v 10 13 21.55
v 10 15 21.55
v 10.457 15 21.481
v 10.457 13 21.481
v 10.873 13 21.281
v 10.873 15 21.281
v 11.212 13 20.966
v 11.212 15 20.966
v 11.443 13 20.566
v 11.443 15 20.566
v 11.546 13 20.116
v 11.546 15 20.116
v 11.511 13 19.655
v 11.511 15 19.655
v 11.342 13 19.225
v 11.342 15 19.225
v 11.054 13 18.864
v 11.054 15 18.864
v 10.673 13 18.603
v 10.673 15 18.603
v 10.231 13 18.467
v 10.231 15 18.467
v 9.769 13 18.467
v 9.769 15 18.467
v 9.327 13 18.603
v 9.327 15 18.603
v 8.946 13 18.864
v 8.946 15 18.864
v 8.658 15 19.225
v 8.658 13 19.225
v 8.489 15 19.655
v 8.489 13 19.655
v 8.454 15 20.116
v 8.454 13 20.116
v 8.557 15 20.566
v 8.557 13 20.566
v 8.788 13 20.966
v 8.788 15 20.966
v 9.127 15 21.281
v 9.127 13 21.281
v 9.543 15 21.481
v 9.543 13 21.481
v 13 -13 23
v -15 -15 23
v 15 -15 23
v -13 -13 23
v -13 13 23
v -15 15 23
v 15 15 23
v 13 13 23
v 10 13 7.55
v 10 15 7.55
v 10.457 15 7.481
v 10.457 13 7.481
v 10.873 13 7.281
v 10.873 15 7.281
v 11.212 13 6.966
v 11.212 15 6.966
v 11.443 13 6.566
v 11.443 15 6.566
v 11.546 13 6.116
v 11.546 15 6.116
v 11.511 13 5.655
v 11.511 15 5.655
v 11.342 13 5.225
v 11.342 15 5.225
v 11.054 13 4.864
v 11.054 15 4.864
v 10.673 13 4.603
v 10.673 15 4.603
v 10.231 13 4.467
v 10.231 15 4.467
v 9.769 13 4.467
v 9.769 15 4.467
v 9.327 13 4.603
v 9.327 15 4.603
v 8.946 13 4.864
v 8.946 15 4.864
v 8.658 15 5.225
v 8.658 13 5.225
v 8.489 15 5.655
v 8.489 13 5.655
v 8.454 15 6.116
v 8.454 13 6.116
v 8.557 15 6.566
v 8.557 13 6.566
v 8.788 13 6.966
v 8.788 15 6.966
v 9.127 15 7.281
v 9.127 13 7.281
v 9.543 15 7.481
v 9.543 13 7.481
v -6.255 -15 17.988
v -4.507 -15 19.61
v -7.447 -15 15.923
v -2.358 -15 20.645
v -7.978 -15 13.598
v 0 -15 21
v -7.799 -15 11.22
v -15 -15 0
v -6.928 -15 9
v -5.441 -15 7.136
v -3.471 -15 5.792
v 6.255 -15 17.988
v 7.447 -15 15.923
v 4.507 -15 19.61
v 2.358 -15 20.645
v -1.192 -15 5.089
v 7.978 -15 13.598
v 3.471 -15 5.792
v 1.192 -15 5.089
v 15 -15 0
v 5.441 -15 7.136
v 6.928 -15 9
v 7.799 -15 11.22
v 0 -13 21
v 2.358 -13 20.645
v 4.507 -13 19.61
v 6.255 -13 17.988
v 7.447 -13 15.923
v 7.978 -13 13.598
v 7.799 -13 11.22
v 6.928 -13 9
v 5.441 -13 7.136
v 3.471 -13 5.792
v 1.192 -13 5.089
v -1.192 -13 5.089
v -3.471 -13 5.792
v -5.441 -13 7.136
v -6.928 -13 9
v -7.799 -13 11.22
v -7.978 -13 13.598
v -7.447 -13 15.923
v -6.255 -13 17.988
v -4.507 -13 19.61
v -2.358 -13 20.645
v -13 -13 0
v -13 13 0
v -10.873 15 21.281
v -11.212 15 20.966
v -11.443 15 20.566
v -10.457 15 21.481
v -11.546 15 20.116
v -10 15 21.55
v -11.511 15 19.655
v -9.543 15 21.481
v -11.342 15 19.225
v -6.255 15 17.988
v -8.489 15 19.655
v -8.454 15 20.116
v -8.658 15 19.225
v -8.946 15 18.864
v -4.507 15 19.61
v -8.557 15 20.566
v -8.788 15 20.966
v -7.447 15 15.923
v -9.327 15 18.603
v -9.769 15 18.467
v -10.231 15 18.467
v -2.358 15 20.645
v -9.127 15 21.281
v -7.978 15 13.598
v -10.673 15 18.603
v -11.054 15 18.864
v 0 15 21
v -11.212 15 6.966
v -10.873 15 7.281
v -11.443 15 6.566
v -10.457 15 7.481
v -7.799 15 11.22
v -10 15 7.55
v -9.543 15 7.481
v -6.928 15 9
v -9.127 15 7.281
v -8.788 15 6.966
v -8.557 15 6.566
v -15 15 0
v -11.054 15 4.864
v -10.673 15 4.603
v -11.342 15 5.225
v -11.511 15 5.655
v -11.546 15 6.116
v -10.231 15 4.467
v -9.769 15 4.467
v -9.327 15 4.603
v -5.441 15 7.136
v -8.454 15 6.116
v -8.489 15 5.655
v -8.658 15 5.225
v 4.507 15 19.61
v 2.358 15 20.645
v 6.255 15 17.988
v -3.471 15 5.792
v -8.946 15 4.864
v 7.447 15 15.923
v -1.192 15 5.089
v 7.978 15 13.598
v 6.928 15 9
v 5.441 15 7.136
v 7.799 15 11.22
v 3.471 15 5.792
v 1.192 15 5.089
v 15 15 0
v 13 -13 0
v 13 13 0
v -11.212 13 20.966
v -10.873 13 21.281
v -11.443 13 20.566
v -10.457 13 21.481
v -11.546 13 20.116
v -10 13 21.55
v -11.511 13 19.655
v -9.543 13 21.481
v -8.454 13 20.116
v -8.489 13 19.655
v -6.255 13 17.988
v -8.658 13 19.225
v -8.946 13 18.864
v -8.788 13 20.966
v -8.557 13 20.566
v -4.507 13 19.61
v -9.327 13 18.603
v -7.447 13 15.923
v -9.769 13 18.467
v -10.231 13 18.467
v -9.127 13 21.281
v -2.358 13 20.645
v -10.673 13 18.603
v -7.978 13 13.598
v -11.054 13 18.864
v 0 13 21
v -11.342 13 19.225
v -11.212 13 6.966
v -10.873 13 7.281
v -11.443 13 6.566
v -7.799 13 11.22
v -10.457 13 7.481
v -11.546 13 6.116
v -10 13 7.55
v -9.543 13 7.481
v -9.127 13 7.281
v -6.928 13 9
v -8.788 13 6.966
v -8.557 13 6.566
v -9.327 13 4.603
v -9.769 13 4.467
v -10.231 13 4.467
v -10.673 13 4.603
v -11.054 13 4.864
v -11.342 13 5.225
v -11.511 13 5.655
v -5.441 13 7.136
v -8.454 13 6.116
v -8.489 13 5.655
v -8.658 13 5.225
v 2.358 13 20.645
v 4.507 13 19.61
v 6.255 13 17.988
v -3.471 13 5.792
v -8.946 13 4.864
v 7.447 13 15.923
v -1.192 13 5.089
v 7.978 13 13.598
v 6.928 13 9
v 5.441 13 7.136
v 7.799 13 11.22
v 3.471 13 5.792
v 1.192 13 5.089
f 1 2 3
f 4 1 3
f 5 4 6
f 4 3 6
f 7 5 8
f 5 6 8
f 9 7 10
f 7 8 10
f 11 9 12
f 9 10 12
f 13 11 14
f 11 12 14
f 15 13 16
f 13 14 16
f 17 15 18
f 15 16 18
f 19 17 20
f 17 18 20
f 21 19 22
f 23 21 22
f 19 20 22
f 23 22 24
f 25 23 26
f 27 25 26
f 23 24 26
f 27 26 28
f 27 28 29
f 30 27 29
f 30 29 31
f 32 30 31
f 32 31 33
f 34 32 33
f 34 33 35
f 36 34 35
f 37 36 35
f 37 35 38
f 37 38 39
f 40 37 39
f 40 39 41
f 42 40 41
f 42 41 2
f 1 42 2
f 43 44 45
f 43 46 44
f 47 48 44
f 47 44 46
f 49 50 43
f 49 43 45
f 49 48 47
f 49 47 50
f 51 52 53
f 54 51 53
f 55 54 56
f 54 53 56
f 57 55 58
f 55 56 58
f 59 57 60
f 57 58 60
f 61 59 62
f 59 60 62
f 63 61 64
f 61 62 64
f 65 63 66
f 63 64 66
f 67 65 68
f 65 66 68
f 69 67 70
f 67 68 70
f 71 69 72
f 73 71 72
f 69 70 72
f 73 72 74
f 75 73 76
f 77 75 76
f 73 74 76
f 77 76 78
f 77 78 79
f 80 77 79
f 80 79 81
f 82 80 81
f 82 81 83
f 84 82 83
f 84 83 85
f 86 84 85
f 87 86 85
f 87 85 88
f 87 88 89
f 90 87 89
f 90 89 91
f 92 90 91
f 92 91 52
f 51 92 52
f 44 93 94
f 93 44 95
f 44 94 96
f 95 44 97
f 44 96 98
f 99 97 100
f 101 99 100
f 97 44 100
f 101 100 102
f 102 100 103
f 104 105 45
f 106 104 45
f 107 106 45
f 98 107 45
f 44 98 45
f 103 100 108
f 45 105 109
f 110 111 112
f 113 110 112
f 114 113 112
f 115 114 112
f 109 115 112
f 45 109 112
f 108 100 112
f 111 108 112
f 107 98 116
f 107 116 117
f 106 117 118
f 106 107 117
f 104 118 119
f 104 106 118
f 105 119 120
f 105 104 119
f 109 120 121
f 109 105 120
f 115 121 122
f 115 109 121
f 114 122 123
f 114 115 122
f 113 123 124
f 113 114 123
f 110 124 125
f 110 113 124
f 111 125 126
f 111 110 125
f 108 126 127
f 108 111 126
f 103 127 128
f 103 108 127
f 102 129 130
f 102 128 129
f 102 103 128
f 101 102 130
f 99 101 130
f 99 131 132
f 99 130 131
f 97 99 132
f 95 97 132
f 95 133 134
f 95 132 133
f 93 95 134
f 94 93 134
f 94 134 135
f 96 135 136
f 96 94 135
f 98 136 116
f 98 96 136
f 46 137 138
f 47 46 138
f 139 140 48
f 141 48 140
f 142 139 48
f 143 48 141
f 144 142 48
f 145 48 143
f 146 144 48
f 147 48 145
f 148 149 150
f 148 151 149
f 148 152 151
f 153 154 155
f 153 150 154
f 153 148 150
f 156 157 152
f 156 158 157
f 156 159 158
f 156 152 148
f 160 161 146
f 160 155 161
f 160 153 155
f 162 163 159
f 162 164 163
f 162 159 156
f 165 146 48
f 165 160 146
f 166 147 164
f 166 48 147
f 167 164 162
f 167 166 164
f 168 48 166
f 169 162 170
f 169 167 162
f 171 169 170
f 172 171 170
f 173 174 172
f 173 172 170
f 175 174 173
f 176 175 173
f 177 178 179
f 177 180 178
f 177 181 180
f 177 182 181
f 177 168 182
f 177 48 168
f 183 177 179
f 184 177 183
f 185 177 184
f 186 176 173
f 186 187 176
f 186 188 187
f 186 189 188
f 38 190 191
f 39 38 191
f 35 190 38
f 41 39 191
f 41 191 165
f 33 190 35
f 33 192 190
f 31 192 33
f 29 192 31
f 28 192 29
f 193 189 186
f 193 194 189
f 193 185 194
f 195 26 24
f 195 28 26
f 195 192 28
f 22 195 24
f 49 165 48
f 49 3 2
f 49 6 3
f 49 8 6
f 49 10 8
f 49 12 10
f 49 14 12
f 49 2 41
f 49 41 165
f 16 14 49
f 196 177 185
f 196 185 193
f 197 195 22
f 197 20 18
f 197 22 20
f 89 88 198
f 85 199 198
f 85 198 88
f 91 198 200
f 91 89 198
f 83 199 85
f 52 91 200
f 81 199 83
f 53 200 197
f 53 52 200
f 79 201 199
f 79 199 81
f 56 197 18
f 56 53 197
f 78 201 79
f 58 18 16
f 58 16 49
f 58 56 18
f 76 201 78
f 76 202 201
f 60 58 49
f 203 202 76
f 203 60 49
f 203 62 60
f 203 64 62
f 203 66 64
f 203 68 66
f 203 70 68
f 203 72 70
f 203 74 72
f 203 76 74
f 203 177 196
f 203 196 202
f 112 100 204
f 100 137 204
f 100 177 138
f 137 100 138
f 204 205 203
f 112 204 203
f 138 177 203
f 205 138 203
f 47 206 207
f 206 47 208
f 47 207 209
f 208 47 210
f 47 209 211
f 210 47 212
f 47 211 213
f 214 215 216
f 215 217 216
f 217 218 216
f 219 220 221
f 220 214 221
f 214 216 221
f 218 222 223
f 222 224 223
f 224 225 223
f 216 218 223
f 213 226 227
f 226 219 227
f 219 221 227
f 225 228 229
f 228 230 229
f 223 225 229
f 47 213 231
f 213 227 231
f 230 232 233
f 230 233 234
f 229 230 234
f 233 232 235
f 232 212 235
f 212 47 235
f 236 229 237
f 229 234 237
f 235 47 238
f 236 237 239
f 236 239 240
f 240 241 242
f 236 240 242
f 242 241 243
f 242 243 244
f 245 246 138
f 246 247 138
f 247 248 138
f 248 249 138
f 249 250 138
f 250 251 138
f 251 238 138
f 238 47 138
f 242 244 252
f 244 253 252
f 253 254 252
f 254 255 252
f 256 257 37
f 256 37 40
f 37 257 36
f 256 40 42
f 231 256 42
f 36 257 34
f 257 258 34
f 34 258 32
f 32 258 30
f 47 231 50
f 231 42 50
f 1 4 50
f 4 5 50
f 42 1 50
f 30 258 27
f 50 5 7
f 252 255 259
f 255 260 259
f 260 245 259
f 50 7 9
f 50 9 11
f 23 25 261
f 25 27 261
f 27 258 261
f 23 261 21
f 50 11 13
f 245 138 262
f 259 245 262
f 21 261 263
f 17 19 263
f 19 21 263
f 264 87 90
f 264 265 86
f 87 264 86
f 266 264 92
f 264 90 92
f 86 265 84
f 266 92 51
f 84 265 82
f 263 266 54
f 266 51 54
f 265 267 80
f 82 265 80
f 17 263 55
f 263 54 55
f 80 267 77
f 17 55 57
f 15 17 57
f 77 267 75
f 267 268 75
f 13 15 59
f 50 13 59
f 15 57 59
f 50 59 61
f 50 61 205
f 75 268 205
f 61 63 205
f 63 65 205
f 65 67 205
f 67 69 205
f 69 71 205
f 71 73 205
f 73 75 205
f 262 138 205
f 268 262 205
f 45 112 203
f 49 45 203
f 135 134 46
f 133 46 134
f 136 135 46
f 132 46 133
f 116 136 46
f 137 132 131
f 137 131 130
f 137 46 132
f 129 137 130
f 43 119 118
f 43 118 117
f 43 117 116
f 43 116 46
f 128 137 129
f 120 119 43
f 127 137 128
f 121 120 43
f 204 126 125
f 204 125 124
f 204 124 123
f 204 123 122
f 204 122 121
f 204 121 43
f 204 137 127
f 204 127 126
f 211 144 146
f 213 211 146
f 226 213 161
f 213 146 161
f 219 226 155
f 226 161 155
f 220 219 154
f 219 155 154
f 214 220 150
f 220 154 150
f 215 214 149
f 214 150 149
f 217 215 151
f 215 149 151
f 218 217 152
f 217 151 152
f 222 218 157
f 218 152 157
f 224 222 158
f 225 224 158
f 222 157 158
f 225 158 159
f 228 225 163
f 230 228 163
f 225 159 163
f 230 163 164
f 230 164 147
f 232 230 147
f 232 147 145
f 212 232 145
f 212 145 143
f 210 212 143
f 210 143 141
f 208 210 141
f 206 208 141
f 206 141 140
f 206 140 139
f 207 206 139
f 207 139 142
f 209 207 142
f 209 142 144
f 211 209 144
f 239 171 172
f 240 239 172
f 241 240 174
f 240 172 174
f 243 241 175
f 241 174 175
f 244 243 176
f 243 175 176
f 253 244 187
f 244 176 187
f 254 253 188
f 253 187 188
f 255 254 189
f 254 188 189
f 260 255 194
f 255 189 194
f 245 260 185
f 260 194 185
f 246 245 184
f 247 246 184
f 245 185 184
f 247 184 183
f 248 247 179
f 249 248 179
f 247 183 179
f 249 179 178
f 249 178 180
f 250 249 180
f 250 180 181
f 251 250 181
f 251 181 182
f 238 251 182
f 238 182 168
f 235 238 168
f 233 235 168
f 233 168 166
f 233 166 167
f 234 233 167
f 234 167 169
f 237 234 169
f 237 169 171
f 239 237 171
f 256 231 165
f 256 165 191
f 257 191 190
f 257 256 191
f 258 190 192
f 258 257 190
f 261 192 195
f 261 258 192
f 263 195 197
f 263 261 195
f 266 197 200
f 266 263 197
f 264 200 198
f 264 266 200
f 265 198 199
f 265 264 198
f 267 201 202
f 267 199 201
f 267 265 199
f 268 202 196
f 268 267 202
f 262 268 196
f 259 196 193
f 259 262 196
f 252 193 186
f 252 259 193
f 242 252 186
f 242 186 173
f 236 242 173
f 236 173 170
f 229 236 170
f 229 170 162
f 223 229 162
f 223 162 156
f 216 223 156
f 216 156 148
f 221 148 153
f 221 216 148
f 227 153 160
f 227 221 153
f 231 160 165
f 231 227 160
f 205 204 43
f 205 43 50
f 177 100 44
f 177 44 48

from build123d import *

# Parameters (mm, degrees)
SKETCH1_W               = 30
SKETCH1_H               = 30
SKETCH1_W_2             = 26
SKETCH1_H_2             = 26
BOSS_EXTRUDE1_DEPTH     = 23
CUT_EXTRUDE1_DEPTH      = 30
CUT_EXTRUDE1_DEPTH_BACK = 3
SKETCH2_R               = 8
SKETCH4_R               = 1.55
CUT_EXTRUDE2_DEPTH      = 3


with BuildPart() as part:
    # Sketch1 → Boss-Extrude1 (new body)
    with BuildSketch(Plane.XY):
        Rectangle(SKETCH1_W, SKETCH1_H)
        Rectangle(SKETCH1_W_2, SKETCH1_H_2, mode=Mode.SUBTRACT)
    extrude(amount=BOSS_EXTRUDE1_DEPTH)

    # Sketch2 → Cut-Extrude1 (cut, two sides: drawn at the far end of the back side and taken through both)
    with BuildSketch(Plane(origin=(0, -13, 0), x_dir=(1, 0, 0), z_dir=(0, 1, 0)).offset(-CUT_EXTRUDE1_DEPTH_BACK)):
        with Locations(Location((0, -13, 0), (0, 0, 270))):
            Circle(SKETCH2_R)
    extrude(amount=CUT_EXTRUDE1_DEPTH + CUT_EXTRUDE1_DEPTH_BACK, mode=Mode.SUBTRACT)

    # Sketch4 → Cut-Extrude2 (cut)
    with BuildSketch(Plane(origin=(0, 15, 0), x_dir=(1, 0, 0), z_dir=(0, 1, 0))):
        with Locations(Location((-10, -6, 0), (0, 0, 270))):
            Circle(SKETCH4_R)
        with Locations(Location((10, -6, 0), (0, 0, 270))):
            Circle(SKETCH4_R)
        with Locations(Location((10, -20, 0), (0, 0, 270))):
            Circle(SKETCH4_R)
        with Locations(Location((-10, -20, 0), (0, 0, 270))):
            Circle(SKETCH4_R)
    extrude(amount=-CUT_EXTRUDE2_DEPTH, mode=Mode.SUBTRACT)


solid = part.part
